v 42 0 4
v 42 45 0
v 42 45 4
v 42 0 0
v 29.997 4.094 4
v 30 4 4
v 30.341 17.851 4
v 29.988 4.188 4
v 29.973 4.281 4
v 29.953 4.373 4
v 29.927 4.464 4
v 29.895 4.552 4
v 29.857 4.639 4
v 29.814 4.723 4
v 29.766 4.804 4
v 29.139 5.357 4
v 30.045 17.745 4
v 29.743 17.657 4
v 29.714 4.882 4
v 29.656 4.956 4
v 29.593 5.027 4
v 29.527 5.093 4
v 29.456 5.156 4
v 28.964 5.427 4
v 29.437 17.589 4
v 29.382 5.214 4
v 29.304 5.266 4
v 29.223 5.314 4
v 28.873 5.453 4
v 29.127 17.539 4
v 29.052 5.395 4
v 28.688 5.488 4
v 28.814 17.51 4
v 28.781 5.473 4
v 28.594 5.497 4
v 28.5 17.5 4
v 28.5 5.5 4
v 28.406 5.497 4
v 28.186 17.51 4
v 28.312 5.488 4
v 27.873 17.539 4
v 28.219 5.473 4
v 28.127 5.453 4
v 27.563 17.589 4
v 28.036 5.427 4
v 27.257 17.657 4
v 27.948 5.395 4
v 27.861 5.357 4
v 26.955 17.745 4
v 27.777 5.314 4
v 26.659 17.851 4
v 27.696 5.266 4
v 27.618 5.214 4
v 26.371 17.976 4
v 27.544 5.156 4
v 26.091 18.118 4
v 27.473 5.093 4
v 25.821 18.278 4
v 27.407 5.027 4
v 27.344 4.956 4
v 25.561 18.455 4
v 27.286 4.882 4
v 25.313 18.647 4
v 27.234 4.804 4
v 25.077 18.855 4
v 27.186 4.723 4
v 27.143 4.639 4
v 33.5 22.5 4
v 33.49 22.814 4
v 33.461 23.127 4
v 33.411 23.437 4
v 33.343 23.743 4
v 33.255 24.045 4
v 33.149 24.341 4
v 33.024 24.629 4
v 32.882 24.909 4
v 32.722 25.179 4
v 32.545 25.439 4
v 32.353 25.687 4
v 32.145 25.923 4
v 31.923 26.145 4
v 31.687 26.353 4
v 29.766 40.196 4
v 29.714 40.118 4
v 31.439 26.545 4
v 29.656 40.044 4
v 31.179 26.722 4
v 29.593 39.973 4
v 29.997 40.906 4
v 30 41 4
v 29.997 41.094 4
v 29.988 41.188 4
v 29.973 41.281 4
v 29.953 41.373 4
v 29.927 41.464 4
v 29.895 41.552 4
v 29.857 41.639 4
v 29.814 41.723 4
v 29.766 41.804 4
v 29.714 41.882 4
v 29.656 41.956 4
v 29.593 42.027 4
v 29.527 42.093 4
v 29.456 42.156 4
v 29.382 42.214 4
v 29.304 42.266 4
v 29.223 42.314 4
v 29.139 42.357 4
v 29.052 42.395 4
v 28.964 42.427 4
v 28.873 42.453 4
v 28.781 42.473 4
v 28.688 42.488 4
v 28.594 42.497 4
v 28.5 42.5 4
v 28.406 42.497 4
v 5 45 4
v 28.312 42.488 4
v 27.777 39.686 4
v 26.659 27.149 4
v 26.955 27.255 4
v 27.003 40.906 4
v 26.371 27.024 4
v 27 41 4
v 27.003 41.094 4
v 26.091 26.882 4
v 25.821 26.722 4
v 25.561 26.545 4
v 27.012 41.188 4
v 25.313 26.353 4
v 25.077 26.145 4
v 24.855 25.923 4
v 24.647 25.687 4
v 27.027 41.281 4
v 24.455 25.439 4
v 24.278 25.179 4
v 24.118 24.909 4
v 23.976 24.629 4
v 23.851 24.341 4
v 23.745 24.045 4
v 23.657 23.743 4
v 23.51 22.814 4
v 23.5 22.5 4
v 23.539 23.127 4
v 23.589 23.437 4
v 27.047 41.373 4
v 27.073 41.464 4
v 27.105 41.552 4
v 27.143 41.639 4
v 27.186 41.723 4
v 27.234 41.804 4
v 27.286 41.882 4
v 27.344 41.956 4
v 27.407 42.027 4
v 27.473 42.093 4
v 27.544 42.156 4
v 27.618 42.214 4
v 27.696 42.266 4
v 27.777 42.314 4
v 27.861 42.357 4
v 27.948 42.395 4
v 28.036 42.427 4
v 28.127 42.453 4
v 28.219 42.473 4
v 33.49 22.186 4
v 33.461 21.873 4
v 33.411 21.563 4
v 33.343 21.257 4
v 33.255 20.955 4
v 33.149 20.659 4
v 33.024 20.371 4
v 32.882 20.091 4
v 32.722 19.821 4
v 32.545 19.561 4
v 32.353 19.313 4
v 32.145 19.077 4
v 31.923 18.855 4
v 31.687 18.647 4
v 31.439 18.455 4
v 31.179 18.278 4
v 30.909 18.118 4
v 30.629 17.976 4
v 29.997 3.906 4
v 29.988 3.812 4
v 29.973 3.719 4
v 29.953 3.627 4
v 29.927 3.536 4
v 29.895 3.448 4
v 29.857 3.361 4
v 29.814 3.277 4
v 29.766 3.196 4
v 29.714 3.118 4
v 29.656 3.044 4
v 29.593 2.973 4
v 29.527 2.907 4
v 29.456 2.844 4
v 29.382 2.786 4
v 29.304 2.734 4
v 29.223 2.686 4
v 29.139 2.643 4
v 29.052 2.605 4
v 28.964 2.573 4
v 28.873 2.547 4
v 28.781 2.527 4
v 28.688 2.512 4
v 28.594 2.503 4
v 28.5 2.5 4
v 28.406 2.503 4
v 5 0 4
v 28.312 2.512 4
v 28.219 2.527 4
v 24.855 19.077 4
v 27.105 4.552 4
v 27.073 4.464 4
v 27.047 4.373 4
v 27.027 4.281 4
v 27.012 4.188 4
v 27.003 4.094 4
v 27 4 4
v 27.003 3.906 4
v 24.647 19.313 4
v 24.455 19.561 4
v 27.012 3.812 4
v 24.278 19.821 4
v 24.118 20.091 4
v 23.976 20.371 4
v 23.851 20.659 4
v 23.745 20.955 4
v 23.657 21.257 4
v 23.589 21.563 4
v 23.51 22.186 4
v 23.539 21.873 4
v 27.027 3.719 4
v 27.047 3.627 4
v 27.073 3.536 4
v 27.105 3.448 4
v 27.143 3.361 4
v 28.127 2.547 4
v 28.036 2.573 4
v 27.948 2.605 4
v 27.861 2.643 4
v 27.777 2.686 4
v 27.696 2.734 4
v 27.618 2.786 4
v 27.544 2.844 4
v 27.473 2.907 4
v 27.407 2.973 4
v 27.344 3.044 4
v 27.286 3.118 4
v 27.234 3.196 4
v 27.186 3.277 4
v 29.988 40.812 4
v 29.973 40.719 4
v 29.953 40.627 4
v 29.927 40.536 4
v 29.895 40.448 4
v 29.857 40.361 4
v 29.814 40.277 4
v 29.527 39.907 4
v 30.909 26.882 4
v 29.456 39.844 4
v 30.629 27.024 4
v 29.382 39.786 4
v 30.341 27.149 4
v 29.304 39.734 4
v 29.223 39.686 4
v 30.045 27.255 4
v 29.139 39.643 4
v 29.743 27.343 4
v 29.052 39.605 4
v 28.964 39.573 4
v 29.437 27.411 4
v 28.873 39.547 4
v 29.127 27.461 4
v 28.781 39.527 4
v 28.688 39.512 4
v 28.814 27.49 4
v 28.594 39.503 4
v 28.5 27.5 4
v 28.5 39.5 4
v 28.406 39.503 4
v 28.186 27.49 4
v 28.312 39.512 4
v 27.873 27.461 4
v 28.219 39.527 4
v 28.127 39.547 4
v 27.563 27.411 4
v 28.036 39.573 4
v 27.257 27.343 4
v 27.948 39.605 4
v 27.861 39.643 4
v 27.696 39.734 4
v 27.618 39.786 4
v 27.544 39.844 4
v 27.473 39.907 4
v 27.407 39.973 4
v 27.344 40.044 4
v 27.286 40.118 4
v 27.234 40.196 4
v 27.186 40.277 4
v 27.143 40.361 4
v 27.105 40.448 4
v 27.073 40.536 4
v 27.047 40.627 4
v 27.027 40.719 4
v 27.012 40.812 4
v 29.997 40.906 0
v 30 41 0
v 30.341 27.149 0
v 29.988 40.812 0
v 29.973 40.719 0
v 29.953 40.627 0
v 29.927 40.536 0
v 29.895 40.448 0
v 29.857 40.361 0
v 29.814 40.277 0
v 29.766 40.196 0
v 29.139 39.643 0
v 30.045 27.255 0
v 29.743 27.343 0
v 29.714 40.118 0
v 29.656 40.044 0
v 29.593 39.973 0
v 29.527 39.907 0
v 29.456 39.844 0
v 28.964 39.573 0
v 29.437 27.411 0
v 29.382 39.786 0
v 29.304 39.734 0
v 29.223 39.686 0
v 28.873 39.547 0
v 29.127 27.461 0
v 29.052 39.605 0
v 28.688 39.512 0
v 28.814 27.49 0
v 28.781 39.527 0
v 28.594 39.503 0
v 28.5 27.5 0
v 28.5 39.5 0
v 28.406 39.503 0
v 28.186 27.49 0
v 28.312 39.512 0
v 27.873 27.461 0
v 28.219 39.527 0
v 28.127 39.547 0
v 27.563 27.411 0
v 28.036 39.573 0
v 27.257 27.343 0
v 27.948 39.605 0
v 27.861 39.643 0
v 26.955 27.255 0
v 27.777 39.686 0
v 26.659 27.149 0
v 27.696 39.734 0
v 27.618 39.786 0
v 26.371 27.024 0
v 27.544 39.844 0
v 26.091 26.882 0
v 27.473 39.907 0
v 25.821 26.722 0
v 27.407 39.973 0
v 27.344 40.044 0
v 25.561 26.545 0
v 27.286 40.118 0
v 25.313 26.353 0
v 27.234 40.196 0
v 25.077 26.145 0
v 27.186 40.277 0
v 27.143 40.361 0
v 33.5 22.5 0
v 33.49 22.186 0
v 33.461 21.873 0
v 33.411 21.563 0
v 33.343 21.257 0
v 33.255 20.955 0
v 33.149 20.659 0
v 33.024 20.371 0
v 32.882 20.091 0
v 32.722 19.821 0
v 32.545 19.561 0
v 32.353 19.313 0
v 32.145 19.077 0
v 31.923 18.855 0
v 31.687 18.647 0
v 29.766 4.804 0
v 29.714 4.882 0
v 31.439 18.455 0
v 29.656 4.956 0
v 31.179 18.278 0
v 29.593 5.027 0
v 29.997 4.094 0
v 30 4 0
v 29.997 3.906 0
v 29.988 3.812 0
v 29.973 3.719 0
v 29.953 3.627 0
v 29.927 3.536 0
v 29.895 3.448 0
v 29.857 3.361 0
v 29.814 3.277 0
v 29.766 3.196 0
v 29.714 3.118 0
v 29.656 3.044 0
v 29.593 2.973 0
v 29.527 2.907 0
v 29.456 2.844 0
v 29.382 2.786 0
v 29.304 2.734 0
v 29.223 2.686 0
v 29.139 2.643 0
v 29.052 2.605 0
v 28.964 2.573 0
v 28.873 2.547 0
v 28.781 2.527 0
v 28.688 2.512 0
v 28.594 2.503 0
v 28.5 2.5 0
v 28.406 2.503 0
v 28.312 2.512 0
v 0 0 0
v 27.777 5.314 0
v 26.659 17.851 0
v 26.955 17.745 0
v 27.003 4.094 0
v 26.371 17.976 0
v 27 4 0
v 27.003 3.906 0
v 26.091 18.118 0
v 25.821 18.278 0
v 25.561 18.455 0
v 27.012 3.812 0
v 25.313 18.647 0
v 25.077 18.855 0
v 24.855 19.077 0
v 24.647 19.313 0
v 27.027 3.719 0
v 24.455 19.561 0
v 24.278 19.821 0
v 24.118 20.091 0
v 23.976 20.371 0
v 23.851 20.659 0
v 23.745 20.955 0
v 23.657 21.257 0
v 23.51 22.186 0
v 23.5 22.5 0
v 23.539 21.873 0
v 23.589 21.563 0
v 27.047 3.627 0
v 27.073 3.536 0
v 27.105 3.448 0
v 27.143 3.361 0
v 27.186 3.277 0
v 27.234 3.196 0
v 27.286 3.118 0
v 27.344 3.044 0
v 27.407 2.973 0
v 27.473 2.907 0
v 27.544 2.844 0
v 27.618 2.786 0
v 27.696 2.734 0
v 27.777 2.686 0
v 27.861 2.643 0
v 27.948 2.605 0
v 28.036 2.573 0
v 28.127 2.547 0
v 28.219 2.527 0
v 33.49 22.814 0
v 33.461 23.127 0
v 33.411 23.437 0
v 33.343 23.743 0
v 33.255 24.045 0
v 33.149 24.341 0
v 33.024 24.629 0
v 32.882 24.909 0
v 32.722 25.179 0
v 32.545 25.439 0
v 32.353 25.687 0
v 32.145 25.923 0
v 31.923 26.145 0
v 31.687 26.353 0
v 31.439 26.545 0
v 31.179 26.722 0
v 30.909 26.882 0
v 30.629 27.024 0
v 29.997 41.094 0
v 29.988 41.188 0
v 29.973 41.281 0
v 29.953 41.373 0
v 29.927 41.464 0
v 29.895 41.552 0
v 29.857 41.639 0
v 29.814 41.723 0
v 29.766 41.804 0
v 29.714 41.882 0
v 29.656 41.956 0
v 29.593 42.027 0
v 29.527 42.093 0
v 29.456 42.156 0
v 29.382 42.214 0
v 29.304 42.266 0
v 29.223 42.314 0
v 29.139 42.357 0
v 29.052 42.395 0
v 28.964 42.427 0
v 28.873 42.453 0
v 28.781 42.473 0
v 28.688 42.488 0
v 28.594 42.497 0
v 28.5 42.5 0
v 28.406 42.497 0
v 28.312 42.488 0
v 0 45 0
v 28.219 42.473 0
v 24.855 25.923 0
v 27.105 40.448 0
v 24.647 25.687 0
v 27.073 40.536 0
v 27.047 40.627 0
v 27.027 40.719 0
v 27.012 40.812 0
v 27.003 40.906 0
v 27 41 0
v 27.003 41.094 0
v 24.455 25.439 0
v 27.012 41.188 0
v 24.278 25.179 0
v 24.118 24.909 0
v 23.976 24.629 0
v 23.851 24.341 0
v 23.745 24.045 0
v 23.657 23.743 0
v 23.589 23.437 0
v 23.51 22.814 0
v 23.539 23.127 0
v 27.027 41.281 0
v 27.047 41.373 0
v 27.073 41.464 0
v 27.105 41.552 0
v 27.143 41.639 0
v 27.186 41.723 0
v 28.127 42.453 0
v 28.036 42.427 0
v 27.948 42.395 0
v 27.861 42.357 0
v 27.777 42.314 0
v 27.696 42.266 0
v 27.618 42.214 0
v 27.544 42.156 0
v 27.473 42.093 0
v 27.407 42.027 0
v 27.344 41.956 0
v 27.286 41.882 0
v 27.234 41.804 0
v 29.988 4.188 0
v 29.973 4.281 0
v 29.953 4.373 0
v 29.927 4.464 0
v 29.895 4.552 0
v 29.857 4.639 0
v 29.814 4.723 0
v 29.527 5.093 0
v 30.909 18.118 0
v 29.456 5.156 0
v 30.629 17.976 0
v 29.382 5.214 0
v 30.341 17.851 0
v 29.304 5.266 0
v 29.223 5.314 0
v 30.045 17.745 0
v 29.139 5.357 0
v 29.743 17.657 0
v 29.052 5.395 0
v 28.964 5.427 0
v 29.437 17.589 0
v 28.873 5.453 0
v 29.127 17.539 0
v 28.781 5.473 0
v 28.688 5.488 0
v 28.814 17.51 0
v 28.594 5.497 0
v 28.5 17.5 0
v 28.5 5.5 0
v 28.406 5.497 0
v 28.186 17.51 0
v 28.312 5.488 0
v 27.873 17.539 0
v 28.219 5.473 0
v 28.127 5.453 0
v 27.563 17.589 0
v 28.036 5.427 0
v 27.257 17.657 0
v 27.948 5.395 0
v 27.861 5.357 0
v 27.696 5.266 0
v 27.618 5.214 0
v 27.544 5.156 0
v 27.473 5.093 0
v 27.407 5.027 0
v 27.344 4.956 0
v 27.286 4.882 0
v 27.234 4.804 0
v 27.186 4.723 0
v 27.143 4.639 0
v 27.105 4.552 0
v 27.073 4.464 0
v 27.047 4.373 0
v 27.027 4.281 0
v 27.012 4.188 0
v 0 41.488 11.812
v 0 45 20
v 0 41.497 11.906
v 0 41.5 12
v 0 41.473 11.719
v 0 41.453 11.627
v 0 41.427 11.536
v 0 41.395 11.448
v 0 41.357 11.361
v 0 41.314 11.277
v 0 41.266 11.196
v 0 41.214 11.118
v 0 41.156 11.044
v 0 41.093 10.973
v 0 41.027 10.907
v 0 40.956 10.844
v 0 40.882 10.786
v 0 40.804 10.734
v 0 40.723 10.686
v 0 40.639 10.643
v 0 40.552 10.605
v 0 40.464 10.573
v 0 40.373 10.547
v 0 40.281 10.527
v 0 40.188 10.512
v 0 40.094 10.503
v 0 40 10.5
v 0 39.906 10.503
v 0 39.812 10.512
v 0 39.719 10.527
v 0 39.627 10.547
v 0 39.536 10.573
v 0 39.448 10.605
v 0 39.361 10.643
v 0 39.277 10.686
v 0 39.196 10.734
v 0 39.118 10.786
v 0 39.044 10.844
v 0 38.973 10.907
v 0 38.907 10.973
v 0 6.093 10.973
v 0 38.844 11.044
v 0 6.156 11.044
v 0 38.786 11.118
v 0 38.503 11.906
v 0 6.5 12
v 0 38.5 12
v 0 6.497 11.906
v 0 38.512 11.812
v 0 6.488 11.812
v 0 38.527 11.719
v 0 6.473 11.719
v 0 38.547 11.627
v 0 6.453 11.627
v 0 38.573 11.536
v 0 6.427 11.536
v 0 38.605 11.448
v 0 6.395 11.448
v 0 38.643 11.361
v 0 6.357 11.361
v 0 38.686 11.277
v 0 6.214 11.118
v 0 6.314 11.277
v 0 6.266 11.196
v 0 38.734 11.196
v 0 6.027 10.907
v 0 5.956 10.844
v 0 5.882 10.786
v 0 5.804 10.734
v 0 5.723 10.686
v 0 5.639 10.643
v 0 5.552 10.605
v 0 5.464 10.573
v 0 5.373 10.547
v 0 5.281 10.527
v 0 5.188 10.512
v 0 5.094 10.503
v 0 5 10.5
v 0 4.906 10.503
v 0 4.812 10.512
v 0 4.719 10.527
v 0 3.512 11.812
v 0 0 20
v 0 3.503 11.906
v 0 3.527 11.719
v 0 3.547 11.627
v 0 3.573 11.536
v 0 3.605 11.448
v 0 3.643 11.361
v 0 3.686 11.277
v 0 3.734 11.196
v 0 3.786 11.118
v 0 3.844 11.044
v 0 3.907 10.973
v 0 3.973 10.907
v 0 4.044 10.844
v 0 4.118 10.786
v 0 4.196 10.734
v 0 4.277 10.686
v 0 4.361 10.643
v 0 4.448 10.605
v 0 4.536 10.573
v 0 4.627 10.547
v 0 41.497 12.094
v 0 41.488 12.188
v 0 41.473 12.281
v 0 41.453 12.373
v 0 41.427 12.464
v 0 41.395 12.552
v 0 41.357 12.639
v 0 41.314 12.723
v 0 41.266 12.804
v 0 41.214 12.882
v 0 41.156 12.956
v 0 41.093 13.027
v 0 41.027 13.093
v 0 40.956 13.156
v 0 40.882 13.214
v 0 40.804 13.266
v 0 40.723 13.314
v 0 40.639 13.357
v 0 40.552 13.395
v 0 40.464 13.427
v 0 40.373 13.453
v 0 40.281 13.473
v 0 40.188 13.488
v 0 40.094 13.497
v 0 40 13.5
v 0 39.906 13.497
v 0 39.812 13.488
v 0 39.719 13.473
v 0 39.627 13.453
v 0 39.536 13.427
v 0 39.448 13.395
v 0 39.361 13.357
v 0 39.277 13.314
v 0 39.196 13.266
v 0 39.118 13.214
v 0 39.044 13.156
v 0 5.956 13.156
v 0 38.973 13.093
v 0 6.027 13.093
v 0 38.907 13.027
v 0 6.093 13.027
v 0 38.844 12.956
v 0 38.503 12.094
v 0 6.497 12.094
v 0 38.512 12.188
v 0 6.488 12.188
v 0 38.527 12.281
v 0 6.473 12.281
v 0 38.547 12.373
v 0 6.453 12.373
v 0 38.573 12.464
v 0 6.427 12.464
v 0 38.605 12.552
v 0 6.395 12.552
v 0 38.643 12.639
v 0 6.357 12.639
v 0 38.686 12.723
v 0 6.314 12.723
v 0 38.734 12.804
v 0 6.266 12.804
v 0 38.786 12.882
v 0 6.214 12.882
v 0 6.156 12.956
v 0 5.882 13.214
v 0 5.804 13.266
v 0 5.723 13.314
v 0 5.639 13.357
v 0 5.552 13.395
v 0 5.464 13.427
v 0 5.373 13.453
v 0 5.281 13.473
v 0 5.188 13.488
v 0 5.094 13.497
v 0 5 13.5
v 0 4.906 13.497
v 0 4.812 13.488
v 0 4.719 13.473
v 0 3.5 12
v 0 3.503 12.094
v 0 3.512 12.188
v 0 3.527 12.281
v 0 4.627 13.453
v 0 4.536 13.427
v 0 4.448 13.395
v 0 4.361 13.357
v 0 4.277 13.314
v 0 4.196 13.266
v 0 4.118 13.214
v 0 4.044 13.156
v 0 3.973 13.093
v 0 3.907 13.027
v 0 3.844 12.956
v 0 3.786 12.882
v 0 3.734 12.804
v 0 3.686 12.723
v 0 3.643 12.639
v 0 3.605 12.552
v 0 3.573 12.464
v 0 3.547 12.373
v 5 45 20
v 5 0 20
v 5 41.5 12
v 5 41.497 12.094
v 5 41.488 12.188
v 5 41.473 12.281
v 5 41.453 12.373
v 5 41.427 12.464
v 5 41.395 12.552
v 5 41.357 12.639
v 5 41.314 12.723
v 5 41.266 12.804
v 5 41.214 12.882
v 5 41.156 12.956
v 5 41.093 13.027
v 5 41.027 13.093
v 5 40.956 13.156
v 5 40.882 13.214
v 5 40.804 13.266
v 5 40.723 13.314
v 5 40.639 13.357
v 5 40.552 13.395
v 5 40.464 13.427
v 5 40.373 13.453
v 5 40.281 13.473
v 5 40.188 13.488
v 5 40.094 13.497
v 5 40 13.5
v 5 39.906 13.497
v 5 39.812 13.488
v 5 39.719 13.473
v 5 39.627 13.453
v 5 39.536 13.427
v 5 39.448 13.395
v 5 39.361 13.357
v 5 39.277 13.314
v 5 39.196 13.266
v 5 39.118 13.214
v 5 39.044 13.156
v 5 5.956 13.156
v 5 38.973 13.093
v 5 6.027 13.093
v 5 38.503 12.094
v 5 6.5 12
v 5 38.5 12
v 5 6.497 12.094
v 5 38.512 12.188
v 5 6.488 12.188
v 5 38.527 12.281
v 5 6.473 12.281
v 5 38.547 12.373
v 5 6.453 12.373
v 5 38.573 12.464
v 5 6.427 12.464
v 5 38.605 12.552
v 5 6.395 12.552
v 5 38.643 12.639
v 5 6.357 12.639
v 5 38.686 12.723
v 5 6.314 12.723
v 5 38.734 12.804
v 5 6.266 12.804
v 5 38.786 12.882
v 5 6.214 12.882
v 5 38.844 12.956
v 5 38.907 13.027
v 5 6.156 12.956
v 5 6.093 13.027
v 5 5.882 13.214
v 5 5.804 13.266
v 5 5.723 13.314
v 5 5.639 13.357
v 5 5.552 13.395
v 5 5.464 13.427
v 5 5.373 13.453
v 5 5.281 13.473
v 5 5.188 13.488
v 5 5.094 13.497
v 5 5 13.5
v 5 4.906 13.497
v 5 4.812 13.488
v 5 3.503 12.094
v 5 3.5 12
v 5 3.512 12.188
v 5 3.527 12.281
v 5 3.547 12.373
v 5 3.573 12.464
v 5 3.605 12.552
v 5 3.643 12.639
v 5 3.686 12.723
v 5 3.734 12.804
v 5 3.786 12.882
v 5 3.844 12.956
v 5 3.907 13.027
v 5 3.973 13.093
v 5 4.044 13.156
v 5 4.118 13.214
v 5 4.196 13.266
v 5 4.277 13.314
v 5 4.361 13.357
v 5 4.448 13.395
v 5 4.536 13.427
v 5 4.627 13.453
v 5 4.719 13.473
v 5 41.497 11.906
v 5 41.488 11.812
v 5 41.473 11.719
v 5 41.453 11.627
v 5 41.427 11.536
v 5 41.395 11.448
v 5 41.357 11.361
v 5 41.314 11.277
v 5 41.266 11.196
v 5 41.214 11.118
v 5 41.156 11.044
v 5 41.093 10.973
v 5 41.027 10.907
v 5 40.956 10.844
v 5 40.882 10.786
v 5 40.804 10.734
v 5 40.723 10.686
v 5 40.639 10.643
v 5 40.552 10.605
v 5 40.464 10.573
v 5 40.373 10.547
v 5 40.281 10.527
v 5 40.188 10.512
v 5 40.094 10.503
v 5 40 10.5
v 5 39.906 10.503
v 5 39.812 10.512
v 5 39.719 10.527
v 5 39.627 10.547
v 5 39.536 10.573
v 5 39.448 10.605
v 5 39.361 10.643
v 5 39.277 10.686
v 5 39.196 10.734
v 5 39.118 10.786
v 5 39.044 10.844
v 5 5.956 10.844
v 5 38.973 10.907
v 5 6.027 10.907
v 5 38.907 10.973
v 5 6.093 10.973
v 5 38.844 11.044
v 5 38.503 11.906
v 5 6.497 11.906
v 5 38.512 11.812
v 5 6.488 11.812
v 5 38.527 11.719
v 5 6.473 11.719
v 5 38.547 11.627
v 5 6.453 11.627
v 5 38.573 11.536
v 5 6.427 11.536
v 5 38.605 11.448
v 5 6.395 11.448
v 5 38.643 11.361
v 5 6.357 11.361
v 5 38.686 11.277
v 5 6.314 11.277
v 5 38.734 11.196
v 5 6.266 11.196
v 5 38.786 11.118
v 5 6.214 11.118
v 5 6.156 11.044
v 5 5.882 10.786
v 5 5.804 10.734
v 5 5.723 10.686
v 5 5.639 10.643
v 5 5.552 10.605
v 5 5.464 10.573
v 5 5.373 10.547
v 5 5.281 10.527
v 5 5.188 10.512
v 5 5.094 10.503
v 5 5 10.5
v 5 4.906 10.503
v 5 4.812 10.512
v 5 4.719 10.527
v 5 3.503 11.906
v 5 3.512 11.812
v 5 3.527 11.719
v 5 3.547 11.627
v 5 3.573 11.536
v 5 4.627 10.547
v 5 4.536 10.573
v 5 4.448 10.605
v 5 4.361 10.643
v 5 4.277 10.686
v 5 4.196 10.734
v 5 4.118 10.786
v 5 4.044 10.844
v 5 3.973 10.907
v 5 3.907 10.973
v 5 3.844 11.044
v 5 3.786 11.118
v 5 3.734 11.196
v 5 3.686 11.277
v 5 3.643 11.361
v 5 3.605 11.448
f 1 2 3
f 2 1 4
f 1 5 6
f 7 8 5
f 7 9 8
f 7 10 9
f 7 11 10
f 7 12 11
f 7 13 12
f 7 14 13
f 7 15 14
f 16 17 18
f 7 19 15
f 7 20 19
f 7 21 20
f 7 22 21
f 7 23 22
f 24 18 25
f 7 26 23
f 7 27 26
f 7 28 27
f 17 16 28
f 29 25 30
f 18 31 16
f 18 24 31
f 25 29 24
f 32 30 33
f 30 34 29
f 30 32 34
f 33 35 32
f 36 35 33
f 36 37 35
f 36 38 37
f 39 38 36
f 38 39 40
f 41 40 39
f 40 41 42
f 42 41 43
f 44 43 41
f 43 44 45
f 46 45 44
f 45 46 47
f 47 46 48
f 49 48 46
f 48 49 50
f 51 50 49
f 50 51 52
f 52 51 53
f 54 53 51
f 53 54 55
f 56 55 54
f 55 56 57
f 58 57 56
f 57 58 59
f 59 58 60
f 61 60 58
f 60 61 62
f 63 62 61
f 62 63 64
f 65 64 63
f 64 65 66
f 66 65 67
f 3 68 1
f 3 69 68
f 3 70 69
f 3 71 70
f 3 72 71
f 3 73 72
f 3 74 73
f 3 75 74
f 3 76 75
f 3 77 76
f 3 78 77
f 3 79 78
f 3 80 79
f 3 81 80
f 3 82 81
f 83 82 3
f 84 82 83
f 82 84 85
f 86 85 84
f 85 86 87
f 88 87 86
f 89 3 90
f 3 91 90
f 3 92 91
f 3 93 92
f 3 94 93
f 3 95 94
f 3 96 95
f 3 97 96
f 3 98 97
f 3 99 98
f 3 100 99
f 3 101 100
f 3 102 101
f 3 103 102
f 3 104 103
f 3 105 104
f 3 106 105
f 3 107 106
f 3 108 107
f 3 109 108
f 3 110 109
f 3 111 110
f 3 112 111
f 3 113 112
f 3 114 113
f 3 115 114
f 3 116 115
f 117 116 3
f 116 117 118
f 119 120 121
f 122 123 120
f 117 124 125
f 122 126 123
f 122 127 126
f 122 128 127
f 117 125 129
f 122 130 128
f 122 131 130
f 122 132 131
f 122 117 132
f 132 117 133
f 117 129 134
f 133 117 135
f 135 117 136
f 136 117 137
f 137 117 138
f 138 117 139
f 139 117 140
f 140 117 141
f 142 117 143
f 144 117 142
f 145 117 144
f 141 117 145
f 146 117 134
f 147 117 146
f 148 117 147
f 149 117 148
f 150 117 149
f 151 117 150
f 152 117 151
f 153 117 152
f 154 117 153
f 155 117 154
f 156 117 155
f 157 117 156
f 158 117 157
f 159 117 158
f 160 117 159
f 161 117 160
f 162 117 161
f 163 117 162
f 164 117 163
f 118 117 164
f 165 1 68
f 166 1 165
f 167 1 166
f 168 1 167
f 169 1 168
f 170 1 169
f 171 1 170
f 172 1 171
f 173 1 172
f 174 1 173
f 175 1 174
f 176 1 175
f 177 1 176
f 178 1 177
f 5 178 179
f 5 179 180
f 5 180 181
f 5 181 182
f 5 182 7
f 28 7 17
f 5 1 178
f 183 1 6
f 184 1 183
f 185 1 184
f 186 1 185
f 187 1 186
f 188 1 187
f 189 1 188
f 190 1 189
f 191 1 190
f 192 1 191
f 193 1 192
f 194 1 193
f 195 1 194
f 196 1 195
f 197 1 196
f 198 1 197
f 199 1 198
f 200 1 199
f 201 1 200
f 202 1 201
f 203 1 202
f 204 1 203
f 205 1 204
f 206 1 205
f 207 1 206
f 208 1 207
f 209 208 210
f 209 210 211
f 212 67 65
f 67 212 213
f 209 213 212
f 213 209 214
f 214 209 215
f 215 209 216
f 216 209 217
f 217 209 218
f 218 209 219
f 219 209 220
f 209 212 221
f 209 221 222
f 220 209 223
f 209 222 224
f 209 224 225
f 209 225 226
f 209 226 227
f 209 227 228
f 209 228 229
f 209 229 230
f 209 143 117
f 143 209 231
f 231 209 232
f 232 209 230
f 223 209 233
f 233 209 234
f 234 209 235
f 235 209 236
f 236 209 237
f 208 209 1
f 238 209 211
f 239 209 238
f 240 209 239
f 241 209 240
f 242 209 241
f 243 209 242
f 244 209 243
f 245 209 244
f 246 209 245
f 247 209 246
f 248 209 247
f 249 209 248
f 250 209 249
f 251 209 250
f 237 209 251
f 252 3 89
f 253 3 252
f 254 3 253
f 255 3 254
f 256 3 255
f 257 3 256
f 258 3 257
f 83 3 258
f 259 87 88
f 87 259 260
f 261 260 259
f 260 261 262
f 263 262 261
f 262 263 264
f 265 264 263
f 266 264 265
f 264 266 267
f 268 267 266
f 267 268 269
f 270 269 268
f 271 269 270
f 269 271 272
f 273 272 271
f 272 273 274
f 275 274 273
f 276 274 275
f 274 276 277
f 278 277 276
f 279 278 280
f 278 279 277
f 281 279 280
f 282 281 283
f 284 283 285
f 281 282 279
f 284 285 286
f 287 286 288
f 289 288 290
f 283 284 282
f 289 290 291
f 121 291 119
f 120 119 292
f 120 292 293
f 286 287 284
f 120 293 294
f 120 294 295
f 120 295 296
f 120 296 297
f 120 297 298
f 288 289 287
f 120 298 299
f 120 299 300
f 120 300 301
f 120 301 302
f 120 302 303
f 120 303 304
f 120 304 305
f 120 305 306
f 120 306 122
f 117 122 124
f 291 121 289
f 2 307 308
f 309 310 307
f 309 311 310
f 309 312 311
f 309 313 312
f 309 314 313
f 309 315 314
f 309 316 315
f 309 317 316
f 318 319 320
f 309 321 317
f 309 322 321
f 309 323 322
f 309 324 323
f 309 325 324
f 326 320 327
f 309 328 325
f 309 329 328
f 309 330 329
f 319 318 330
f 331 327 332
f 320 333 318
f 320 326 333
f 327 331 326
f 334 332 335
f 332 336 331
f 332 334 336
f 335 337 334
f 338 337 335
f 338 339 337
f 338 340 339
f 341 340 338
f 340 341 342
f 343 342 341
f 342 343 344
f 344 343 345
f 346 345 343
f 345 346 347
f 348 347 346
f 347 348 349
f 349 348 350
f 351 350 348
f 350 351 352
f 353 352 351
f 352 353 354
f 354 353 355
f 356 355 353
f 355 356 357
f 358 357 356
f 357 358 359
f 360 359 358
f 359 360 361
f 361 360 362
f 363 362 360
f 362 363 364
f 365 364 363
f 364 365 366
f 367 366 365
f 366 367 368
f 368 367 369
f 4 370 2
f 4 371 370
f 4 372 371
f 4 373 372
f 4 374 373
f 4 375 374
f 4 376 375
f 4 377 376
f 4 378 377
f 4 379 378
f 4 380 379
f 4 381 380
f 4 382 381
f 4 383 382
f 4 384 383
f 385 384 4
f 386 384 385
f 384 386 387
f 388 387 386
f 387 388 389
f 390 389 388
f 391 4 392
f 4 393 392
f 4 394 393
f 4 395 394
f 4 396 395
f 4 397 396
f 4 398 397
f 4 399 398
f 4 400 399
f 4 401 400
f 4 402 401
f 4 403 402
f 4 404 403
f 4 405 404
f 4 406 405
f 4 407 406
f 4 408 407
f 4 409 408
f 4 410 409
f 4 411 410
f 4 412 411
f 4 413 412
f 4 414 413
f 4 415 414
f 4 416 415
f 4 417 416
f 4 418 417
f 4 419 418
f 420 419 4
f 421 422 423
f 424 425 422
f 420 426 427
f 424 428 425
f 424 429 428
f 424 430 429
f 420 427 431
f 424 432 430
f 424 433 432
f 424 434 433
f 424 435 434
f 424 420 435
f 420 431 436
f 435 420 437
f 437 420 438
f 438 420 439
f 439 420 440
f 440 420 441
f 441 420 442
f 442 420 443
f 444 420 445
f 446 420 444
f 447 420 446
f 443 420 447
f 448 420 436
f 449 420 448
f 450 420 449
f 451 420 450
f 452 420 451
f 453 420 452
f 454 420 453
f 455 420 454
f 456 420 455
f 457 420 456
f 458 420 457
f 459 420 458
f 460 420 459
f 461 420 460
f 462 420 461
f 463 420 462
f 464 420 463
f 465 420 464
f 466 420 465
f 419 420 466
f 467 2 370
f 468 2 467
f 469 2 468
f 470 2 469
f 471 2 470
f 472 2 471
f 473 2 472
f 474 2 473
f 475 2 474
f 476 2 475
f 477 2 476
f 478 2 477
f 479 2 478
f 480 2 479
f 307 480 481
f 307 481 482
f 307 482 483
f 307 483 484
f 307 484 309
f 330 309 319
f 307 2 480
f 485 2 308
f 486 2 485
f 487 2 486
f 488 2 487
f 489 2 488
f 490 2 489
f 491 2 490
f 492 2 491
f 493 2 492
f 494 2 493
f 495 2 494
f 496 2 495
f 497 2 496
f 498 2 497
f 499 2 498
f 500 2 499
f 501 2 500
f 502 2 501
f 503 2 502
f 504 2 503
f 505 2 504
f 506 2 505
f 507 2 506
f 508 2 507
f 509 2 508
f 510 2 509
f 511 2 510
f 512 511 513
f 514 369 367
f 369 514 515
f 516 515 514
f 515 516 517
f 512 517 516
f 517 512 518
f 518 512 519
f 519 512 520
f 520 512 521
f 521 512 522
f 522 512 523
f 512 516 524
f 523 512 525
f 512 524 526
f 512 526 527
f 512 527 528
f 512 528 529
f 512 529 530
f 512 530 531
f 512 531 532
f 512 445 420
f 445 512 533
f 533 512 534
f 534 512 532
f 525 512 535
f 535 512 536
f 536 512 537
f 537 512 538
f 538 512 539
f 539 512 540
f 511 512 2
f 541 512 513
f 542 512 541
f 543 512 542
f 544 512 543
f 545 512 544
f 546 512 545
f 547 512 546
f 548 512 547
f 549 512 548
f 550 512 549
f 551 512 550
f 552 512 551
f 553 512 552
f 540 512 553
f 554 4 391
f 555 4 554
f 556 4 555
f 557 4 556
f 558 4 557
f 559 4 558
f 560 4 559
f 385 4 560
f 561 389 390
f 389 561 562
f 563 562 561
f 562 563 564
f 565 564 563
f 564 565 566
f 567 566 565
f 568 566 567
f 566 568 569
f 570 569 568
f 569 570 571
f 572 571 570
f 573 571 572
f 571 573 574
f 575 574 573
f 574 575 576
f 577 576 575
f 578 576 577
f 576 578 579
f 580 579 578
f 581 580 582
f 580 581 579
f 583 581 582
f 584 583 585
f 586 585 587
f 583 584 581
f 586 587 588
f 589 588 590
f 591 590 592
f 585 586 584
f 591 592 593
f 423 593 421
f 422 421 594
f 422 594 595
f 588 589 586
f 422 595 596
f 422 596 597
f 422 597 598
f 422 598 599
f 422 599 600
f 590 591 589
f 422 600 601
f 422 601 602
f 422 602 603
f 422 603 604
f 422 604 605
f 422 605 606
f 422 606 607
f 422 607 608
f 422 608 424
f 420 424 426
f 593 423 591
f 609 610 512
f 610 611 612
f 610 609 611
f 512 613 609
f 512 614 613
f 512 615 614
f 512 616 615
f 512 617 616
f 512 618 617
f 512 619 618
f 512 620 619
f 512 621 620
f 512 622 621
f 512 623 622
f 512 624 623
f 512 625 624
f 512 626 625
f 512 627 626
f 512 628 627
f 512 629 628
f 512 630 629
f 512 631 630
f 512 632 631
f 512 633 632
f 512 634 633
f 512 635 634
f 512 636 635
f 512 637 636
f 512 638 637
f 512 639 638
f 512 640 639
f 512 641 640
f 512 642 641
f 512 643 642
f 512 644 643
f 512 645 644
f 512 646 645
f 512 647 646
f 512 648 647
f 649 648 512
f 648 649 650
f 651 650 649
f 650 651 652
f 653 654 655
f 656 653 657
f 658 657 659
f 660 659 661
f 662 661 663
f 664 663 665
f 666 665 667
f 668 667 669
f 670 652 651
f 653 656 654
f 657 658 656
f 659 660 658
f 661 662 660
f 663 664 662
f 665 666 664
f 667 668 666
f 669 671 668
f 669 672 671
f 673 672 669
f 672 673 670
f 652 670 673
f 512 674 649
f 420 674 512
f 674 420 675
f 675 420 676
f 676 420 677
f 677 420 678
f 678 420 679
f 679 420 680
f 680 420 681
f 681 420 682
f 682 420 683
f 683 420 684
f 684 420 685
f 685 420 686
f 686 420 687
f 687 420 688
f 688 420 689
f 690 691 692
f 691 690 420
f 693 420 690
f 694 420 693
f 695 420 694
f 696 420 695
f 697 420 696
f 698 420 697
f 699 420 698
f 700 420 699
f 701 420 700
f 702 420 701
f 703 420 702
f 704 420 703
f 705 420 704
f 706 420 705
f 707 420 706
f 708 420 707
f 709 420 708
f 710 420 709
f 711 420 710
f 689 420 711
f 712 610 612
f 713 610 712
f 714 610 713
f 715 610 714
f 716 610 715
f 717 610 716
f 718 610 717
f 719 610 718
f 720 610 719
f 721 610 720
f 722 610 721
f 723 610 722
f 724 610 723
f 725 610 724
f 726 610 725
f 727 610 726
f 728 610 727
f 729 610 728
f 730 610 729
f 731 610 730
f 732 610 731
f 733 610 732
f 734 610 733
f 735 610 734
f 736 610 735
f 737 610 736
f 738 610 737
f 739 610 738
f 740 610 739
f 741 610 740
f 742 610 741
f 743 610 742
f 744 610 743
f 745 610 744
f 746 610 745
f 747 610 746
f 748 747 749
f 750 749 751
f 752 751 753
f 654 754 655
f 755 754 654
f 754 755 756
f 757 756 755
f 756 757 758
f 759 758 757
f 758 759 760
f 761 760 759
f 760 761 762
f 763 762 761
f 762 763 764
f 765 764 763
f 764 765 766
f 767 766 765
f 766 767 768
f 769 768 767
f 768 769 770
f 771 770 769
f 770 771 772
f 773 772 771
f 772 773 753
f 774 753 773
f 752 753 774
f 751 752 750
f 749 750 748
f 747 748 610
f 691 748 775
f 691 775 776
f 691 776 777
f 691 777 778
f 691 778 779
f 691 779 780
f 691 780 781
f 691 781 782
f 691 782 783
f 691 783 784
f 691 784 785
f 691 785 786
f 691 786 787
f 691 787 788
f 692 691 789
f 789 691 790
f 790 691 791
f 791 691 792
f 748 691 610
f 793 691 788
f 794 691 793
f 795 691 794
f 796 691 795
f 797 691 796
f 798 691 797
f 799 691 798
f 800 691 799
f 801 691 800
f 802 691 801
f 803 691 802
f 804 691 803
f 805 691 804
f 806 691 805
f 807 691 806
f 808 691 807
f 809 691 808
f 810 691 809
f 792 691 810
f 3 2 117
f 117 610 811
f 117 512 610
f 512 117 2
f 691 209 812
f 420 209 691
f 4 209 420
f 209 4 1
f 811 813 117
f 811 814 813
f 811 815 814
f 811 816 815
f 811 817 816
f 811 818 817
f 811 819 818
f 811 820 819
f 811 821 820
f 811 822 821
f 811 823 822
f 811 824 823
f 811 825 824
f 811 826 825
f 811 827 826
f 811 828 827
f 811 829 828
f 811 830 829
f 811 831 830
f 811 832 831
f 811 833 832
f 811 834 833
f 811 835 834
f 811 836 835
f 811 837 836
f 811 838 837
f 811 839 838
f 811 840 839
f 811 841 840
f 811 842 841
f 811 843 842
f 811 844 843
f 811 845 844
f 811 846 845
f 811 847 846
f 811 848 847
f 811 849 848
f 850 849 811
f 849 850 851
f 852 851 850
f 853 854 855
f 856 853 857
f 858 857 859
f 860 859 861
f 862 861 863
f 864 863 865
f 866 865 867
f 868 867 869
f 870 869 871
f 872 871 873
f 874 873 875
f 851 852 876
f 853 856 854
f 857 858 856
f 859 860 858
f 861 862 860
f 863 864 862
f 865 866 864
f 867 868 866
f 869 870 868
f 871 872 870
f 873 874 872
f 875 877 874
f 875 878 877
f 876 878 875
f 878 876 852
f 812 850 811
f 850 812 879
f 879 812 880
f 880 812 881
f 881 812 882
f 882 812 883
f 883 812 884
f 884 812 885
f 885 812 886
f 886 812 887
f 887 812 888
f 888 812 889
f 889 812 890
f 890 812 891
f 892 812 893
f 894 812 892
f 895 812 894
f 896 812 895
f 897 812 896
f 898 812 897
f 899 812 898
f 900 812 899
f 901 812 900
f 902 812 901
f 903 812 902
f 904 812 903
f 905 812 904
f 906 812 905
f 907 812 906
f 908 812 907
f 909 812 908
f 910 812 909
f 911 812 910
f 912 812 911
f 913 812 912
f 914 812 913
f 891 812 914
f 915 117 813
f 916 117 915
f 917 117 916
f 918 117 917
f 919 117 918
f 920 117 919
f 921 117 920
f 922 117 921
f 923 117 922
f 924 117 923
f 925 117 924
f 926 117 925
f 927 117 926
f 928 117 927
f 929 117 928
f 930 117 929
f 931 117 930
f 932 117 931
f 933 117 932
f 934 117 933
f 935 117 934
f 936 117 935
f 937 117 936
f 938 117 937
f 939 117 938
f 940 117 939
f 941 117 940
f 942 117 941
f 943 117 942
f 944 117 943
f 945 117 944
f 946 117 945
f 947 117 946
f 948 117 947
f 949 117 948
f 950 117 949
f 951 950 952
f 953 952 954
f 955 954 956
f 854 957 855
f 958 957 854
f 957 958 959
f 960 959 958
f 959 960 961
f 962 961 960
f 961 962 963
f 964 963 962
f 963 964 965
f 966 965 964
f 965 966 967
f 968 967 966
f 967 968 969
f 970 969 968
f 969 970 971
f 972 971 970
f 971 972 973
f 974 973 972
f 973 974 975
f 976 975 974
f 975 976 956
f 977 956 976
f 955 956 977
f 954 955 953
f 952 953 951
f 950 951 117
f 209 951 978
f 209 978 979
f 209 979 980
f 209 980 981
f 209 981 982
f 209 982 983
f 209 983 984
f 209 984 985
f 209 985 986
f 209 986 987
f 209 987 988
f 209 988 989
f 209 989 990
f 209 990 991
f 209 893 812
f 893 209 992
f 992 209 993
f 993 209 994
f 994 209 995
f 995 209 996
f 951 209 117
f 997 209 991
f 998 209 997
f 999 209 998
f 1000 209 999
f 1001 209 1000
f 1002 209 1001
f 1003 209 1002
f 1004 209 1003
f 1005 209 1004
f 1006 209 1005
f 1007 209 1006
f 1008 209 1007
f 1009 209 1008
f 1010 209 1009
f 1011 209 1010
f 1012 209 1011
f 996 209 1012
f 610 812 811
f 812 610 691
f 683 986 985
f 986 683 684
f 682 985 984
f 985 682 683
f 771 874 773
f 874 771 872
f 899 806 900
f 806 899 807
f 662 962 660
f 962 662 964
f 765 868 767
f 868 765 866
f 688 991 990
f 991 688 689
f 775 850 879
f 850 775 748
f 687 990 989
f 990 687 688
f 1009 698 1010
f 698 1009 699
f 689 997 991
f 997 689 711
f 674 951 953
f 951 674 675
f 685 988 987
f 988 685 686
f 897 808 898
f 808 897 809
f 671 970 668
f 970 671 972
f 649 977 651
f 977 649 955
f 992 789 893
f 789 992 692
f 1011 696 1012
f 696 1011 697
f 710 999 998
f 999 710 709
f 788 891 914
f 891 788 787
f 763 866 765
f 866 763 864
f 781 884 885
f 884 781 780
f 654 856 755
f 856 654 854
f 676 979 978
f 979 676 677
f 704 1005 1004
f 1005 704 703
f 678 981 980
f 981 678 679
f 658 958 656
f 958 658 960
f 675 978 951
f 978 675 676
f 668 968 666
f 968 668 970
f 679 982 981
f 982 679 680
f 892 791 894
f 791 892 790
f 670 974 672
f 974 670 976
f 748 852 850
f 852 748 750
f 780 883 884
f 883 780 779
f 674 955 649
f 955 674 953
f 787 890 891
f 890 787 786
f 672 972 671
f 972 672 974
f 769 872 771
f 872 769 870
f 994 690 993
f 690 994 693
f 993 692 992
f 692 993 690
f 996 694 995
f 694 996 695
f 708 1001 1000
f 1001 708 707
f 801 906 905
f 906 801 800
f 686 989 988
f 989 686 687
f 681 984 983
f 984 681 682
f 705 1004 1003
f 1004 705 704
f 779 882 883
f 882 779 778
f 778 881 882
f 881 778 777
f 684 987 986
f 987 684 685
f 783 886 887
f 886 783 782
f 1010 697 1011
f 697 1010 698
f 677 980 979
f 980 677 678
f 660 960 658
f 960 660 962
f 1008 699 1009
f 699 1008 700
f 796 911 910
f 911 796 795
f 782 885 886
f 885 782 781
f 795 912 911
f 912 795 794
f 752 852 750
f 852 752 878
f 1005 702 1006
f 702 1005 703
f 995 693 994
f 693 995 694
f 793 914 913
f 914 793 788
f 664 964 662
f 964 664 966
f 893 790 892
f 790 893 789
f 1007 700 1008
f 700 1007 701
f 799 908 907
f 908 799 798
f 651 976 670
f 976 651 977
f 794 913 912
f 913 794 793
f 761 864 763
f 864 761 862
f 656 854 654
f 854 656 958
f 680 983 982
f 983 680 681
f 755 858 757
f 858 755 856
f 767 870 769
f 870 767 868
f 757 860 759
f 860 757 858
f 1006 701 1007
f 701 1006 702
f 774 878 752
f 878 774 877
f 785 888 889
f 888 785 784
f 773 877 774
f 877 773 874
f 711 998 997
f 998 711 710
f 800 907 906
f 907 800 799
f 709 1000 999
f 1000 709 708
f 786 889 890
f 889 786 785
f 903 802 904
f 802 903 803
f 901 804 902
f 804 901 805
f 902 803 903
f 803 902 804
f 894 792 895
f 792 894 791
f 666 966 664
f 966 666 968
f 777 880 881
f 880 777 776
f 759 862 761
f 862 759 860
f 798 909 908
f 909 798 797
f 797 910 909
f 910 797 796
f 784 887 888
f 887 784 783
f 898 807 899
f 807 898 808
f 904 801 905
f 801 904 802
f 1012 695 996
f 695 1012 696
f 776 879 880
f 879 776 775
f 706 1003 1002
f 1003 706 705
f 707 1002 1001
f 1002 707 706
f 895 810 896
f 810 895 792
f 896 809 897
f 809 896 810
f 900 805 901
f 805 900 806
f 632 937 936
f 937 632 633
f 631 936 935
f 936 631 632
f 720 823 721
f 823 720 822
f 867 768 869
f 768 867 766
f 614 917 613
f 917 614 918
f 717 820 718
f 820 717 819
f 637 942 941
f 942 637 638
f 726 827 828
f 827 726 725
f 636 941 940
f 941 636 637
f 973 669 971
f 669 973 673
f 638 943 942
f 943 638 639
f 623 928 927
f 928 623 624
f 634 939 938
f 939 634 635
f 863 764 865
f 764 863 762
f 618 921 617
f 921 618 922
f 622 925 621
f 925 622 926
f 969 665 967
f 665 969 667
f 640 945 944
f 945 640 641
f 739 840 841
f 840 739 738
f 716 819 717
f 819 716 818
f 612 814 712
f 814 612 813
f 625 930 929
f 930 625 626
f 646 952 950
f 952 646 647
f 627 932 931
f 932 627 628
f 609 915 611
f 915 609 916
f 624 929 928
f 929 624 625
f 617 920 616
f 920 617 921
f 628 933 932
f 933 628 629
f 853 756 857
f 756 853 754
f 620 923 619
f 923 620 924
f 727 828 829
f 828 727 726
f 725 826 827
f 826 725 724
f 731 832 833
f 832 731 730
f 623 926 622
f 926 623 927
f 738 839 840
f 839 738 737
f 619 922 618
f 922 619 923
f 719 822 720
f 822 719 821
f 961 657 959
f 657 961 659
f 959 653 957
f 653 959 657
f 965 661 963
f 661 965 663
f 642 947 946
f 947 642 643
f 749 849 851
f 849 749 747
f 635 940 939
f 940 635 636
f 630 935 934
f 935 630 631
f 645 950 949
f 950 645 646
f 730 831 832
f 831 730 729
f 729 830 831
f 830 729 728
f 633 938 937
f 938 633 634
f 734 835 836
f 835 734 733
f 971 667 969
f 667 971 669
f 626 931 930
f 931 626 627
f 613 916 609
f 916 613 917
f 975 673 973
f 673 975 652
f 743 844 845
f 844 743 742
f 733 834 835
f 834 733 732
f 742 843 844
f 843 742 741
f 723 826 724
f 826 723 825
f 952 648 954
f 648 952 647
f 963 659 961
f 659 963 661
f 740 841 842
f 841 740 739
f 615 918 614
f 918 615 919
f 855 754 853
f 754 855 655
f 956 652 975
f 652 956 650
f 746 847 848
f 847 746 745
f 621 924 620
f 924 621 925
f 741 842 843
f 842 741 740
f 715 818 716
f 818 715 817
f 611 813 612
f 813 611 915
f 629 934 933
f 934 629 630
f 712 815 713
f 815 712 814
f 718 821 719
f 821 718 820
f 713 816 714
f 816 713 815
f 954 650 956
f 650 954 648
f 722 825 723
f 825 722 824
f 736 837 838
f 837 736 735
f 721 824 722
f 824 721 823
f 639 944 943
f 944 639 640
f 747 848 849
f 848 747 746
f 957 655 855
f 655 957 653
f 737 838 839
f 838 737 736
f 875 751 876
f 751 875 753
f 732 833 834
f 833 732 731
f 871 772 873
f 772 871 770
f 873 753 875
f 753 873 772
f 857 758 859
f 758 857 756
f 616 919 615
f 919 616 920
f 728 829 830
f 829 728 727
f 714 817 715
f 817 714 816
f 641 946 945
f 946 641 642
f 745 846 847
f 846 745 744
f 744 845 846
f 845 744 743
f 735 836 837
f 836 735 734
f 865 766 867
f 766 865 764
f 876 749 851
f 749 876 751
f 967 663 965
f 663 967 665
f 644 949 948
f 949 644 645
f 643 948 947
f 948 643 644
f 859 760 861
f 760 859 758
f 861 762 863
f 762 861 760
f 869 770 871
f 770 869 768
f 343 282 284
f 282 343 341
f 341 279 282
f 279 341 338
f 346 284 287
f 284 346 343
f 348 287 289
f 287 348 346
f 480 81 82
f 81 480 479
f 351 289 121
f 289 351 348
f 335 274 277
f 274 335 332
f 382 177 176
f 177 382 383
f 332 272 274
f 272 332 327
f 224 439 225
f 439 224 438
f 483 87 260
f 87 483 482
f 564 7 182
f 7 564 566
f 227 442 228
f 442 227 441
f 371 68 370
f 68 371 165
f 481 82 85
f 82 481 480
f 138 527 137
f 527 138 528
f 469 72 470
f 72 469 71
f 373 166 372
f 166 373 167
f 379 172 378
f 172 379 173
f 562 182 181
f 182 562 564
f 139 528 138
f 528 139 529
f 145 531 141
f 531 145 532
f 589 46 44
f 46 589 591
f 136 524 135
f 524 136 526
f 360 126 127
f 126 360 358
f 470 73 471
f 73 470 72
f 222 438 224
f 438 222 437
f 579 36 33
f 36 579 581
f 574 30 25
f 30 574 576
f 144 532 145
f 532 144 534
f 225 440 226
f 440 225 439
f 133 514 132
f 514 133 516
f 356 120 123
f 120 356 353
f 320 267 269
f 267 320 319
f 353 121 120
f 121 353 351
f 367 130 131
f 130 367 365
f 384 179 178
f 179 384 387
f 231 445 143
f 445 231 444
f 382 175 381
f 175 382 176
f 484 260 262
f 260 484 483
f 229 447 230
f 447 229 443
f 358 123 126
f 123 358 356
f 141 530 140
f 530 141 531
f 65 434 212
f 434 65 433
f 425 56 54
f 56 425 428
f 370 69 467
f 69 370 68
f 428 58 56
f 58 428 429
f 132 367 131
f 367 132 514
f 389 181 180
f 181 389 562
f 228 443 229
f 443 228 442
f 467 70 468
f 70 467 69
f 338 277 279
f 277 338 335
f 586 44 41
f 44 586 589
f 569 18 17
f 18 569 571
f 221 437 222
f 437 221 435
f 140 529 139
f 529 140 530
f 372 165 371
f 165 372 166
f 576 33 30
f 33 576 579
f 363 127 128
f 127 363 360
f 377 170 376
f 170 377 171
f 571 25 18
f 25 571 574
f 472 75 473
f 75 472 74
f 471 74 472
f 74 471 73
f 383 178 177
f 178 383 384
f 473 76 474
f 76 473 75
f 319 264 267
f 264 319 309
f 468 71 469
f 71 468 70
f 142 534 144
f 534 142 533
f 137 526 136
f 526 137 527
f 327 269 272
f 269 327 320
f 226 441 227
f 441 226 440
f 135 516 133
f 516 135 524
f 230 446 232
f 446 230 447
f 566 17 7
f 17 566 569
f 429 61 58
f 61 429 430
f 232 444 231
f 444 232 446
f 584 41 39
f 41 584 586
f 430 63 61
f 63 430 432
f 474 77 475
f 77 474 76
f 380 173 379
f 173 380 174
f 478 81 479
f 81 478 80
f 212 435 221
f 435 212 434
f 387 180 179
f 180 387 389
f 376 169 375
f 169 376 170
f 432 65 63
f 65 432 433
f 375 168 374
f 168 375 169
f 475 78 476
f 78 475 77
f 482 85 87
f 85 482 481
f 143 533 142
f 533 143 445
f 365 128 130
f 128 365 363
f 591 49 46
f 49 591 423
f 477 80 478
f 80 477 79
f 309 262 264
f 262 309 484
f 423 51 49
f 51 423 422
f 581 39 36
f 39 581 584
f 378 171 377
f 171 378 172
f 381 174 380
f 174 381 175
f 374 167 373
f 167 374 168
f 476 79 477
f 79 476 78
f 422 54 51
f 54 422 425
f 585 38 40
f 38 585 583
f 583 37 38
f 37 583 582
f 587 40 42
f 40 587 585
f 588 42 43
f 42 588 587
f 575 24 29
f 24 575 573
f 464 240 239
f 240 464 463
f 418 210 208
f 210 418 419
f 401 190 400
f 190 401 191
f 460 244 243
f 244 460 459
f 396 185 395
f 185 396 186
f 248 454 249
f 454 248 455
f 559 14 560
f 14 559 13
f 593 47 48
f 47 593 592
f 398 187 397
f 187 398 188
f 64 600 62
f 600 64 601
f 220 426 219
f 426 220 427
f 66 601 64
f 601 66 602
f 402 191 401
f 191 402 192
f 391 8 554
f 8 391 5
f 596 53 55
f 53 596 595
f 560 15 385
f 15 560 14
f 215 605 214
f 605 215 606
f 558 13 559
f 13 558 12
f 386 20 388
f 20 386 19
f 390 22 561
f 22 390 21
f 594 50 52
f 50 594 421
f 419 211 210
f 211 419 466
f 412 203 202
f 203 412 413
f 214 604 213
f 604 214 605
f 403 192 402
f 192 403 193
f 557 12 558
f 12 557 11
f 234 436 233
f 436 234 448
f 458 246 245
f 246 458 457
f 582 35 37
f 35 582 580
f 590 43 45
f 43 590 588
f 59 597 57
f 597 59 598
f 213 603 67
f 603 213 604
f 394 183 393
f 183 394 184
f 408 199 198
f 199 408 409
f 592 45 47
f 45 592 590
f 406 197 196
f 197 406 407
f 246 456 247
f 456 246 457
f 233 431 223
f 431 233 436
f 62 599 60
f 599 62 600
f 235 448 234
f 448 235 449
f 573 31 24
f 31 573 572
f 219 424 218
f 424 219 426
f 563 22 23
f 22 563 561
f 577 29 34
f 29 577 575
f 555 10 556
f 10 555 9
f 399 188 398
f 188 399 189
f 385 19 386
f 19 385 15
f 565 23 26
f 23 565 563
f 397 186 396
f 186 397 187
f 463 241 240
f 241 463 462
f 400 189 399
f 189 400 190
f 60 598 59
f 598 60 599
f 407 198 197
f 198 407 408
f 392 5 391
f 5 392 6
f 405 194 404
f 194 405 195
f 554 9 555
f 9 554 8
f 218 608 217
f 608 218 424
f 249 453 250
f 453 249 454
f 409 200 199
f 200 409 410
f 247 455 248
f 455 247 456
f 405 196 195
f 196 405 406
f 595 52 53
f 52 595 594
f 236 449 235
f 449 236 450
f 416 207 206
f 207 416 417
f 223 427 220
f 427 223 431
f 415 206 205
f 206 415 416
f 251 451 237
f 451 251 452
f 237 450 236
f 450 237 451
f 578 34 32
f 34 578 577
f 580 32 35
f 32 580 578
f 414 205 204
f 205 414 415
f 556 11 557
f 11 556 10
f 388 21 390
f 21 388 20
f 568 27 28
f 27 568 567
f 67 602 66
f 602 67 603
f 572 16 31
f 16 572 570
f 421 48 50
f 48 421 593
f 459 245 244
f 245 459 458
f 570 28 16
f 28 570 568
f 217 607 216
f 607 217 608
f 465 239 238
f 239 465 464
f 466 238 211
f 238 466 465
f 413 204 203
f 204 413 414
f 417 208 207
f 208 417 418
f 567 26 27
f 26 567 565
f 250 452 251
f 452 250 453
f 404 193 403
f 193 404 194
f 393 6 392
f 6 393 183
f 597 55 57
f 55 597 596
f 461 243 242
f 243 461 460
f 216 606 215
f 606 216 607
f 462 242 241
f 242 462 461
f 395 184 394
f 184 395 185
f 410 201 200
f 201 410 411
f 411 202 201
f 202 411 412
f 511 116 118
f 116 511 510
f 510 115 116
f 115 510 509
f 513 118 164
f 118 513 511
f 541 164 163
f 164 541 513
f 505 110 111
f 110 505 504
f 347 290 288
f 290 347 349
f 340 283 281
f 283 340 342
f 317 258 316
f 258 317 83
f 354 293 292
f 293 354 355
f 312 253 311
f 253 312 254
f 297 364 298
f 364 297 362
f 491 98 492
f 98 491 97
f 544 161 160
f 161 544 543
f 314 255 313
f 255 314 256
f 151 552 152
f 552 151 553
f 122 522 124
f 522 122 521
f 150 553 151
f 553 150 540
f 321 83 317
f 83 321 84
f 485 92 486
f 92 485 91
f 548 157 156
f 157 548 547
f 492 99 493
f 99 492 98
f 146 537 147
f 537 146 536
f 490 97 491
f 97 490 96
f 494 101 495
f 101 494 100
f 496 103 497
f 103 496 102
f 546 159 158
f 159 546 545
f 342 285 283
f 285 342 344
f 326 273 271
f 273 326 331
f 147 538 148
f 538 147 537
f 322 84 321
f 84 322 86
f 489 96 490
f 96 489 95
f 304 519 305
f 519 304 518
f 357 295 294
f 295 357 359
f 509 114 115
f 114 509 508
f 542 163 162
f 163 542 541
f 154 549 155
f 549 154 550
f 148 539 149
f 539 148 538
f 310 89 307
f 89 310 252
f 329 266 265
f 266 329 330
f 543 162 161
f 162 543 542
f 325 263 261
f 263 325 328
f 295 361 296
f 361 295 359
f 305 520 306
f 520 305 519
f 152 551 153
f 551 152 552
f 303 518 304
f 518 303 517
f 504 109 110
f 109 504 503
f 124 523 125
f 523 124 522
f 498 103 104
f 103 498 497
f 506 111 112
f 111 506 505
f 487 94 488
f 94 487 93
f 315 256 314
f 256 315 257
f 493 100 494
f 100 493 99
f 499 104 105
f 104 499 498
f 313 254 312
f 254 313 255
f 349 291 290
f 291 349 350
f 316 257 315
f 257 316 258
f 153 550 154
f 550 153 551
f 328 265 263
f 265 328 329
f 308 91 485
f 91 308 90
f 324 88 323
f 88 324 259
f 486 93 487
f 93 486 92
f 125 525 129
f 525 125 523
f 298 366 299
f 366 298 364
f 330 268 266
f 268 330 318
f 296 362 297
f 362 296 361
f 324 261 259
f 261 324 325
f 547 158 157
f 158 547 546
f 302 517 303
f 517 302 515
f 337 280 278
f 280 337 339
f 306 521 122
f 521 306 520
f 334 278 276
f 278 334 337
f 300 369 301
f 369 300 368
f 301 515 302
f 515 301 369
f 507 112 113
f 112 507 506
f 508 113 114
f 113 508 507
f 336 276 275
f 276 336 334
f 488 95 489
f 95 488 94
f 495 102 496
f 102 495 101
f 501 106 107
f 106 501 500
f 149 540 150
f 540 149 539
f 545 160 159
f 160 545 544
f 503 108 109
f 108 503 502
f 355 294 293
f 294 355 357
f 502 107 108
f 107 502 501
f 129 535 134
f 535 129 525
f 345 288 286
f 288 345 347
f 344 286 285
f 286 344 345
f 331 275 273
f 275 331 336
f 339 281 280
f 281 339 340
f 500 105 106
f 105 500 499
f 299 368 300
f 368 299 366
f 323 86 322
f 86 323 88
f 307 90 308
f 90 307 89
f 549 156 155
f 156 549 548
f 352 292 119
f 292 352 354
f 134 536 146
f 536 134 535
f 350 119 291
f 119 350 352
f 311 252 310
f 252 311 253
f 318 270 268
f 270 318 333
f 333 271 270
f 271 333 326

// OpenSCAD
difference(){
	union(){

        translate([0,0,0]){
           cube([42,45,4], center=false);
        }
        translate([0,0,0]){
           cube([5,45,20], center=false);
        }
	}
	union() {

        translate([0,5,12]){
            rotate([0,90,0]){
                cylinder(h=200, r=1.5, $fn=100, center=true);
            }
        }
        translate([0,45-5,12]){
            rotate([0,90,0]){
                cylinder(h=200, r=1.5, $fn=100, center=true);
            }
        }

        translate([47/2+5,45/2,0]){
            rotate([0,0,90]){
                cylinder(h=200, r=5, $fn=100, center=true);
            }
        }

        translate([47/2+5,45/2-18.5,0]){
            rotate([0,0,90]){
                cylinder(h=200, r=1.5, $fn=100, center=true);
            }
        }
        translate([47/2+5,45/2+18.5,0]){
            rotate([0,0,90]){
                cylinder(h=200, r=1.5, $fn=100, center=true);
            }
        }

	}
}
